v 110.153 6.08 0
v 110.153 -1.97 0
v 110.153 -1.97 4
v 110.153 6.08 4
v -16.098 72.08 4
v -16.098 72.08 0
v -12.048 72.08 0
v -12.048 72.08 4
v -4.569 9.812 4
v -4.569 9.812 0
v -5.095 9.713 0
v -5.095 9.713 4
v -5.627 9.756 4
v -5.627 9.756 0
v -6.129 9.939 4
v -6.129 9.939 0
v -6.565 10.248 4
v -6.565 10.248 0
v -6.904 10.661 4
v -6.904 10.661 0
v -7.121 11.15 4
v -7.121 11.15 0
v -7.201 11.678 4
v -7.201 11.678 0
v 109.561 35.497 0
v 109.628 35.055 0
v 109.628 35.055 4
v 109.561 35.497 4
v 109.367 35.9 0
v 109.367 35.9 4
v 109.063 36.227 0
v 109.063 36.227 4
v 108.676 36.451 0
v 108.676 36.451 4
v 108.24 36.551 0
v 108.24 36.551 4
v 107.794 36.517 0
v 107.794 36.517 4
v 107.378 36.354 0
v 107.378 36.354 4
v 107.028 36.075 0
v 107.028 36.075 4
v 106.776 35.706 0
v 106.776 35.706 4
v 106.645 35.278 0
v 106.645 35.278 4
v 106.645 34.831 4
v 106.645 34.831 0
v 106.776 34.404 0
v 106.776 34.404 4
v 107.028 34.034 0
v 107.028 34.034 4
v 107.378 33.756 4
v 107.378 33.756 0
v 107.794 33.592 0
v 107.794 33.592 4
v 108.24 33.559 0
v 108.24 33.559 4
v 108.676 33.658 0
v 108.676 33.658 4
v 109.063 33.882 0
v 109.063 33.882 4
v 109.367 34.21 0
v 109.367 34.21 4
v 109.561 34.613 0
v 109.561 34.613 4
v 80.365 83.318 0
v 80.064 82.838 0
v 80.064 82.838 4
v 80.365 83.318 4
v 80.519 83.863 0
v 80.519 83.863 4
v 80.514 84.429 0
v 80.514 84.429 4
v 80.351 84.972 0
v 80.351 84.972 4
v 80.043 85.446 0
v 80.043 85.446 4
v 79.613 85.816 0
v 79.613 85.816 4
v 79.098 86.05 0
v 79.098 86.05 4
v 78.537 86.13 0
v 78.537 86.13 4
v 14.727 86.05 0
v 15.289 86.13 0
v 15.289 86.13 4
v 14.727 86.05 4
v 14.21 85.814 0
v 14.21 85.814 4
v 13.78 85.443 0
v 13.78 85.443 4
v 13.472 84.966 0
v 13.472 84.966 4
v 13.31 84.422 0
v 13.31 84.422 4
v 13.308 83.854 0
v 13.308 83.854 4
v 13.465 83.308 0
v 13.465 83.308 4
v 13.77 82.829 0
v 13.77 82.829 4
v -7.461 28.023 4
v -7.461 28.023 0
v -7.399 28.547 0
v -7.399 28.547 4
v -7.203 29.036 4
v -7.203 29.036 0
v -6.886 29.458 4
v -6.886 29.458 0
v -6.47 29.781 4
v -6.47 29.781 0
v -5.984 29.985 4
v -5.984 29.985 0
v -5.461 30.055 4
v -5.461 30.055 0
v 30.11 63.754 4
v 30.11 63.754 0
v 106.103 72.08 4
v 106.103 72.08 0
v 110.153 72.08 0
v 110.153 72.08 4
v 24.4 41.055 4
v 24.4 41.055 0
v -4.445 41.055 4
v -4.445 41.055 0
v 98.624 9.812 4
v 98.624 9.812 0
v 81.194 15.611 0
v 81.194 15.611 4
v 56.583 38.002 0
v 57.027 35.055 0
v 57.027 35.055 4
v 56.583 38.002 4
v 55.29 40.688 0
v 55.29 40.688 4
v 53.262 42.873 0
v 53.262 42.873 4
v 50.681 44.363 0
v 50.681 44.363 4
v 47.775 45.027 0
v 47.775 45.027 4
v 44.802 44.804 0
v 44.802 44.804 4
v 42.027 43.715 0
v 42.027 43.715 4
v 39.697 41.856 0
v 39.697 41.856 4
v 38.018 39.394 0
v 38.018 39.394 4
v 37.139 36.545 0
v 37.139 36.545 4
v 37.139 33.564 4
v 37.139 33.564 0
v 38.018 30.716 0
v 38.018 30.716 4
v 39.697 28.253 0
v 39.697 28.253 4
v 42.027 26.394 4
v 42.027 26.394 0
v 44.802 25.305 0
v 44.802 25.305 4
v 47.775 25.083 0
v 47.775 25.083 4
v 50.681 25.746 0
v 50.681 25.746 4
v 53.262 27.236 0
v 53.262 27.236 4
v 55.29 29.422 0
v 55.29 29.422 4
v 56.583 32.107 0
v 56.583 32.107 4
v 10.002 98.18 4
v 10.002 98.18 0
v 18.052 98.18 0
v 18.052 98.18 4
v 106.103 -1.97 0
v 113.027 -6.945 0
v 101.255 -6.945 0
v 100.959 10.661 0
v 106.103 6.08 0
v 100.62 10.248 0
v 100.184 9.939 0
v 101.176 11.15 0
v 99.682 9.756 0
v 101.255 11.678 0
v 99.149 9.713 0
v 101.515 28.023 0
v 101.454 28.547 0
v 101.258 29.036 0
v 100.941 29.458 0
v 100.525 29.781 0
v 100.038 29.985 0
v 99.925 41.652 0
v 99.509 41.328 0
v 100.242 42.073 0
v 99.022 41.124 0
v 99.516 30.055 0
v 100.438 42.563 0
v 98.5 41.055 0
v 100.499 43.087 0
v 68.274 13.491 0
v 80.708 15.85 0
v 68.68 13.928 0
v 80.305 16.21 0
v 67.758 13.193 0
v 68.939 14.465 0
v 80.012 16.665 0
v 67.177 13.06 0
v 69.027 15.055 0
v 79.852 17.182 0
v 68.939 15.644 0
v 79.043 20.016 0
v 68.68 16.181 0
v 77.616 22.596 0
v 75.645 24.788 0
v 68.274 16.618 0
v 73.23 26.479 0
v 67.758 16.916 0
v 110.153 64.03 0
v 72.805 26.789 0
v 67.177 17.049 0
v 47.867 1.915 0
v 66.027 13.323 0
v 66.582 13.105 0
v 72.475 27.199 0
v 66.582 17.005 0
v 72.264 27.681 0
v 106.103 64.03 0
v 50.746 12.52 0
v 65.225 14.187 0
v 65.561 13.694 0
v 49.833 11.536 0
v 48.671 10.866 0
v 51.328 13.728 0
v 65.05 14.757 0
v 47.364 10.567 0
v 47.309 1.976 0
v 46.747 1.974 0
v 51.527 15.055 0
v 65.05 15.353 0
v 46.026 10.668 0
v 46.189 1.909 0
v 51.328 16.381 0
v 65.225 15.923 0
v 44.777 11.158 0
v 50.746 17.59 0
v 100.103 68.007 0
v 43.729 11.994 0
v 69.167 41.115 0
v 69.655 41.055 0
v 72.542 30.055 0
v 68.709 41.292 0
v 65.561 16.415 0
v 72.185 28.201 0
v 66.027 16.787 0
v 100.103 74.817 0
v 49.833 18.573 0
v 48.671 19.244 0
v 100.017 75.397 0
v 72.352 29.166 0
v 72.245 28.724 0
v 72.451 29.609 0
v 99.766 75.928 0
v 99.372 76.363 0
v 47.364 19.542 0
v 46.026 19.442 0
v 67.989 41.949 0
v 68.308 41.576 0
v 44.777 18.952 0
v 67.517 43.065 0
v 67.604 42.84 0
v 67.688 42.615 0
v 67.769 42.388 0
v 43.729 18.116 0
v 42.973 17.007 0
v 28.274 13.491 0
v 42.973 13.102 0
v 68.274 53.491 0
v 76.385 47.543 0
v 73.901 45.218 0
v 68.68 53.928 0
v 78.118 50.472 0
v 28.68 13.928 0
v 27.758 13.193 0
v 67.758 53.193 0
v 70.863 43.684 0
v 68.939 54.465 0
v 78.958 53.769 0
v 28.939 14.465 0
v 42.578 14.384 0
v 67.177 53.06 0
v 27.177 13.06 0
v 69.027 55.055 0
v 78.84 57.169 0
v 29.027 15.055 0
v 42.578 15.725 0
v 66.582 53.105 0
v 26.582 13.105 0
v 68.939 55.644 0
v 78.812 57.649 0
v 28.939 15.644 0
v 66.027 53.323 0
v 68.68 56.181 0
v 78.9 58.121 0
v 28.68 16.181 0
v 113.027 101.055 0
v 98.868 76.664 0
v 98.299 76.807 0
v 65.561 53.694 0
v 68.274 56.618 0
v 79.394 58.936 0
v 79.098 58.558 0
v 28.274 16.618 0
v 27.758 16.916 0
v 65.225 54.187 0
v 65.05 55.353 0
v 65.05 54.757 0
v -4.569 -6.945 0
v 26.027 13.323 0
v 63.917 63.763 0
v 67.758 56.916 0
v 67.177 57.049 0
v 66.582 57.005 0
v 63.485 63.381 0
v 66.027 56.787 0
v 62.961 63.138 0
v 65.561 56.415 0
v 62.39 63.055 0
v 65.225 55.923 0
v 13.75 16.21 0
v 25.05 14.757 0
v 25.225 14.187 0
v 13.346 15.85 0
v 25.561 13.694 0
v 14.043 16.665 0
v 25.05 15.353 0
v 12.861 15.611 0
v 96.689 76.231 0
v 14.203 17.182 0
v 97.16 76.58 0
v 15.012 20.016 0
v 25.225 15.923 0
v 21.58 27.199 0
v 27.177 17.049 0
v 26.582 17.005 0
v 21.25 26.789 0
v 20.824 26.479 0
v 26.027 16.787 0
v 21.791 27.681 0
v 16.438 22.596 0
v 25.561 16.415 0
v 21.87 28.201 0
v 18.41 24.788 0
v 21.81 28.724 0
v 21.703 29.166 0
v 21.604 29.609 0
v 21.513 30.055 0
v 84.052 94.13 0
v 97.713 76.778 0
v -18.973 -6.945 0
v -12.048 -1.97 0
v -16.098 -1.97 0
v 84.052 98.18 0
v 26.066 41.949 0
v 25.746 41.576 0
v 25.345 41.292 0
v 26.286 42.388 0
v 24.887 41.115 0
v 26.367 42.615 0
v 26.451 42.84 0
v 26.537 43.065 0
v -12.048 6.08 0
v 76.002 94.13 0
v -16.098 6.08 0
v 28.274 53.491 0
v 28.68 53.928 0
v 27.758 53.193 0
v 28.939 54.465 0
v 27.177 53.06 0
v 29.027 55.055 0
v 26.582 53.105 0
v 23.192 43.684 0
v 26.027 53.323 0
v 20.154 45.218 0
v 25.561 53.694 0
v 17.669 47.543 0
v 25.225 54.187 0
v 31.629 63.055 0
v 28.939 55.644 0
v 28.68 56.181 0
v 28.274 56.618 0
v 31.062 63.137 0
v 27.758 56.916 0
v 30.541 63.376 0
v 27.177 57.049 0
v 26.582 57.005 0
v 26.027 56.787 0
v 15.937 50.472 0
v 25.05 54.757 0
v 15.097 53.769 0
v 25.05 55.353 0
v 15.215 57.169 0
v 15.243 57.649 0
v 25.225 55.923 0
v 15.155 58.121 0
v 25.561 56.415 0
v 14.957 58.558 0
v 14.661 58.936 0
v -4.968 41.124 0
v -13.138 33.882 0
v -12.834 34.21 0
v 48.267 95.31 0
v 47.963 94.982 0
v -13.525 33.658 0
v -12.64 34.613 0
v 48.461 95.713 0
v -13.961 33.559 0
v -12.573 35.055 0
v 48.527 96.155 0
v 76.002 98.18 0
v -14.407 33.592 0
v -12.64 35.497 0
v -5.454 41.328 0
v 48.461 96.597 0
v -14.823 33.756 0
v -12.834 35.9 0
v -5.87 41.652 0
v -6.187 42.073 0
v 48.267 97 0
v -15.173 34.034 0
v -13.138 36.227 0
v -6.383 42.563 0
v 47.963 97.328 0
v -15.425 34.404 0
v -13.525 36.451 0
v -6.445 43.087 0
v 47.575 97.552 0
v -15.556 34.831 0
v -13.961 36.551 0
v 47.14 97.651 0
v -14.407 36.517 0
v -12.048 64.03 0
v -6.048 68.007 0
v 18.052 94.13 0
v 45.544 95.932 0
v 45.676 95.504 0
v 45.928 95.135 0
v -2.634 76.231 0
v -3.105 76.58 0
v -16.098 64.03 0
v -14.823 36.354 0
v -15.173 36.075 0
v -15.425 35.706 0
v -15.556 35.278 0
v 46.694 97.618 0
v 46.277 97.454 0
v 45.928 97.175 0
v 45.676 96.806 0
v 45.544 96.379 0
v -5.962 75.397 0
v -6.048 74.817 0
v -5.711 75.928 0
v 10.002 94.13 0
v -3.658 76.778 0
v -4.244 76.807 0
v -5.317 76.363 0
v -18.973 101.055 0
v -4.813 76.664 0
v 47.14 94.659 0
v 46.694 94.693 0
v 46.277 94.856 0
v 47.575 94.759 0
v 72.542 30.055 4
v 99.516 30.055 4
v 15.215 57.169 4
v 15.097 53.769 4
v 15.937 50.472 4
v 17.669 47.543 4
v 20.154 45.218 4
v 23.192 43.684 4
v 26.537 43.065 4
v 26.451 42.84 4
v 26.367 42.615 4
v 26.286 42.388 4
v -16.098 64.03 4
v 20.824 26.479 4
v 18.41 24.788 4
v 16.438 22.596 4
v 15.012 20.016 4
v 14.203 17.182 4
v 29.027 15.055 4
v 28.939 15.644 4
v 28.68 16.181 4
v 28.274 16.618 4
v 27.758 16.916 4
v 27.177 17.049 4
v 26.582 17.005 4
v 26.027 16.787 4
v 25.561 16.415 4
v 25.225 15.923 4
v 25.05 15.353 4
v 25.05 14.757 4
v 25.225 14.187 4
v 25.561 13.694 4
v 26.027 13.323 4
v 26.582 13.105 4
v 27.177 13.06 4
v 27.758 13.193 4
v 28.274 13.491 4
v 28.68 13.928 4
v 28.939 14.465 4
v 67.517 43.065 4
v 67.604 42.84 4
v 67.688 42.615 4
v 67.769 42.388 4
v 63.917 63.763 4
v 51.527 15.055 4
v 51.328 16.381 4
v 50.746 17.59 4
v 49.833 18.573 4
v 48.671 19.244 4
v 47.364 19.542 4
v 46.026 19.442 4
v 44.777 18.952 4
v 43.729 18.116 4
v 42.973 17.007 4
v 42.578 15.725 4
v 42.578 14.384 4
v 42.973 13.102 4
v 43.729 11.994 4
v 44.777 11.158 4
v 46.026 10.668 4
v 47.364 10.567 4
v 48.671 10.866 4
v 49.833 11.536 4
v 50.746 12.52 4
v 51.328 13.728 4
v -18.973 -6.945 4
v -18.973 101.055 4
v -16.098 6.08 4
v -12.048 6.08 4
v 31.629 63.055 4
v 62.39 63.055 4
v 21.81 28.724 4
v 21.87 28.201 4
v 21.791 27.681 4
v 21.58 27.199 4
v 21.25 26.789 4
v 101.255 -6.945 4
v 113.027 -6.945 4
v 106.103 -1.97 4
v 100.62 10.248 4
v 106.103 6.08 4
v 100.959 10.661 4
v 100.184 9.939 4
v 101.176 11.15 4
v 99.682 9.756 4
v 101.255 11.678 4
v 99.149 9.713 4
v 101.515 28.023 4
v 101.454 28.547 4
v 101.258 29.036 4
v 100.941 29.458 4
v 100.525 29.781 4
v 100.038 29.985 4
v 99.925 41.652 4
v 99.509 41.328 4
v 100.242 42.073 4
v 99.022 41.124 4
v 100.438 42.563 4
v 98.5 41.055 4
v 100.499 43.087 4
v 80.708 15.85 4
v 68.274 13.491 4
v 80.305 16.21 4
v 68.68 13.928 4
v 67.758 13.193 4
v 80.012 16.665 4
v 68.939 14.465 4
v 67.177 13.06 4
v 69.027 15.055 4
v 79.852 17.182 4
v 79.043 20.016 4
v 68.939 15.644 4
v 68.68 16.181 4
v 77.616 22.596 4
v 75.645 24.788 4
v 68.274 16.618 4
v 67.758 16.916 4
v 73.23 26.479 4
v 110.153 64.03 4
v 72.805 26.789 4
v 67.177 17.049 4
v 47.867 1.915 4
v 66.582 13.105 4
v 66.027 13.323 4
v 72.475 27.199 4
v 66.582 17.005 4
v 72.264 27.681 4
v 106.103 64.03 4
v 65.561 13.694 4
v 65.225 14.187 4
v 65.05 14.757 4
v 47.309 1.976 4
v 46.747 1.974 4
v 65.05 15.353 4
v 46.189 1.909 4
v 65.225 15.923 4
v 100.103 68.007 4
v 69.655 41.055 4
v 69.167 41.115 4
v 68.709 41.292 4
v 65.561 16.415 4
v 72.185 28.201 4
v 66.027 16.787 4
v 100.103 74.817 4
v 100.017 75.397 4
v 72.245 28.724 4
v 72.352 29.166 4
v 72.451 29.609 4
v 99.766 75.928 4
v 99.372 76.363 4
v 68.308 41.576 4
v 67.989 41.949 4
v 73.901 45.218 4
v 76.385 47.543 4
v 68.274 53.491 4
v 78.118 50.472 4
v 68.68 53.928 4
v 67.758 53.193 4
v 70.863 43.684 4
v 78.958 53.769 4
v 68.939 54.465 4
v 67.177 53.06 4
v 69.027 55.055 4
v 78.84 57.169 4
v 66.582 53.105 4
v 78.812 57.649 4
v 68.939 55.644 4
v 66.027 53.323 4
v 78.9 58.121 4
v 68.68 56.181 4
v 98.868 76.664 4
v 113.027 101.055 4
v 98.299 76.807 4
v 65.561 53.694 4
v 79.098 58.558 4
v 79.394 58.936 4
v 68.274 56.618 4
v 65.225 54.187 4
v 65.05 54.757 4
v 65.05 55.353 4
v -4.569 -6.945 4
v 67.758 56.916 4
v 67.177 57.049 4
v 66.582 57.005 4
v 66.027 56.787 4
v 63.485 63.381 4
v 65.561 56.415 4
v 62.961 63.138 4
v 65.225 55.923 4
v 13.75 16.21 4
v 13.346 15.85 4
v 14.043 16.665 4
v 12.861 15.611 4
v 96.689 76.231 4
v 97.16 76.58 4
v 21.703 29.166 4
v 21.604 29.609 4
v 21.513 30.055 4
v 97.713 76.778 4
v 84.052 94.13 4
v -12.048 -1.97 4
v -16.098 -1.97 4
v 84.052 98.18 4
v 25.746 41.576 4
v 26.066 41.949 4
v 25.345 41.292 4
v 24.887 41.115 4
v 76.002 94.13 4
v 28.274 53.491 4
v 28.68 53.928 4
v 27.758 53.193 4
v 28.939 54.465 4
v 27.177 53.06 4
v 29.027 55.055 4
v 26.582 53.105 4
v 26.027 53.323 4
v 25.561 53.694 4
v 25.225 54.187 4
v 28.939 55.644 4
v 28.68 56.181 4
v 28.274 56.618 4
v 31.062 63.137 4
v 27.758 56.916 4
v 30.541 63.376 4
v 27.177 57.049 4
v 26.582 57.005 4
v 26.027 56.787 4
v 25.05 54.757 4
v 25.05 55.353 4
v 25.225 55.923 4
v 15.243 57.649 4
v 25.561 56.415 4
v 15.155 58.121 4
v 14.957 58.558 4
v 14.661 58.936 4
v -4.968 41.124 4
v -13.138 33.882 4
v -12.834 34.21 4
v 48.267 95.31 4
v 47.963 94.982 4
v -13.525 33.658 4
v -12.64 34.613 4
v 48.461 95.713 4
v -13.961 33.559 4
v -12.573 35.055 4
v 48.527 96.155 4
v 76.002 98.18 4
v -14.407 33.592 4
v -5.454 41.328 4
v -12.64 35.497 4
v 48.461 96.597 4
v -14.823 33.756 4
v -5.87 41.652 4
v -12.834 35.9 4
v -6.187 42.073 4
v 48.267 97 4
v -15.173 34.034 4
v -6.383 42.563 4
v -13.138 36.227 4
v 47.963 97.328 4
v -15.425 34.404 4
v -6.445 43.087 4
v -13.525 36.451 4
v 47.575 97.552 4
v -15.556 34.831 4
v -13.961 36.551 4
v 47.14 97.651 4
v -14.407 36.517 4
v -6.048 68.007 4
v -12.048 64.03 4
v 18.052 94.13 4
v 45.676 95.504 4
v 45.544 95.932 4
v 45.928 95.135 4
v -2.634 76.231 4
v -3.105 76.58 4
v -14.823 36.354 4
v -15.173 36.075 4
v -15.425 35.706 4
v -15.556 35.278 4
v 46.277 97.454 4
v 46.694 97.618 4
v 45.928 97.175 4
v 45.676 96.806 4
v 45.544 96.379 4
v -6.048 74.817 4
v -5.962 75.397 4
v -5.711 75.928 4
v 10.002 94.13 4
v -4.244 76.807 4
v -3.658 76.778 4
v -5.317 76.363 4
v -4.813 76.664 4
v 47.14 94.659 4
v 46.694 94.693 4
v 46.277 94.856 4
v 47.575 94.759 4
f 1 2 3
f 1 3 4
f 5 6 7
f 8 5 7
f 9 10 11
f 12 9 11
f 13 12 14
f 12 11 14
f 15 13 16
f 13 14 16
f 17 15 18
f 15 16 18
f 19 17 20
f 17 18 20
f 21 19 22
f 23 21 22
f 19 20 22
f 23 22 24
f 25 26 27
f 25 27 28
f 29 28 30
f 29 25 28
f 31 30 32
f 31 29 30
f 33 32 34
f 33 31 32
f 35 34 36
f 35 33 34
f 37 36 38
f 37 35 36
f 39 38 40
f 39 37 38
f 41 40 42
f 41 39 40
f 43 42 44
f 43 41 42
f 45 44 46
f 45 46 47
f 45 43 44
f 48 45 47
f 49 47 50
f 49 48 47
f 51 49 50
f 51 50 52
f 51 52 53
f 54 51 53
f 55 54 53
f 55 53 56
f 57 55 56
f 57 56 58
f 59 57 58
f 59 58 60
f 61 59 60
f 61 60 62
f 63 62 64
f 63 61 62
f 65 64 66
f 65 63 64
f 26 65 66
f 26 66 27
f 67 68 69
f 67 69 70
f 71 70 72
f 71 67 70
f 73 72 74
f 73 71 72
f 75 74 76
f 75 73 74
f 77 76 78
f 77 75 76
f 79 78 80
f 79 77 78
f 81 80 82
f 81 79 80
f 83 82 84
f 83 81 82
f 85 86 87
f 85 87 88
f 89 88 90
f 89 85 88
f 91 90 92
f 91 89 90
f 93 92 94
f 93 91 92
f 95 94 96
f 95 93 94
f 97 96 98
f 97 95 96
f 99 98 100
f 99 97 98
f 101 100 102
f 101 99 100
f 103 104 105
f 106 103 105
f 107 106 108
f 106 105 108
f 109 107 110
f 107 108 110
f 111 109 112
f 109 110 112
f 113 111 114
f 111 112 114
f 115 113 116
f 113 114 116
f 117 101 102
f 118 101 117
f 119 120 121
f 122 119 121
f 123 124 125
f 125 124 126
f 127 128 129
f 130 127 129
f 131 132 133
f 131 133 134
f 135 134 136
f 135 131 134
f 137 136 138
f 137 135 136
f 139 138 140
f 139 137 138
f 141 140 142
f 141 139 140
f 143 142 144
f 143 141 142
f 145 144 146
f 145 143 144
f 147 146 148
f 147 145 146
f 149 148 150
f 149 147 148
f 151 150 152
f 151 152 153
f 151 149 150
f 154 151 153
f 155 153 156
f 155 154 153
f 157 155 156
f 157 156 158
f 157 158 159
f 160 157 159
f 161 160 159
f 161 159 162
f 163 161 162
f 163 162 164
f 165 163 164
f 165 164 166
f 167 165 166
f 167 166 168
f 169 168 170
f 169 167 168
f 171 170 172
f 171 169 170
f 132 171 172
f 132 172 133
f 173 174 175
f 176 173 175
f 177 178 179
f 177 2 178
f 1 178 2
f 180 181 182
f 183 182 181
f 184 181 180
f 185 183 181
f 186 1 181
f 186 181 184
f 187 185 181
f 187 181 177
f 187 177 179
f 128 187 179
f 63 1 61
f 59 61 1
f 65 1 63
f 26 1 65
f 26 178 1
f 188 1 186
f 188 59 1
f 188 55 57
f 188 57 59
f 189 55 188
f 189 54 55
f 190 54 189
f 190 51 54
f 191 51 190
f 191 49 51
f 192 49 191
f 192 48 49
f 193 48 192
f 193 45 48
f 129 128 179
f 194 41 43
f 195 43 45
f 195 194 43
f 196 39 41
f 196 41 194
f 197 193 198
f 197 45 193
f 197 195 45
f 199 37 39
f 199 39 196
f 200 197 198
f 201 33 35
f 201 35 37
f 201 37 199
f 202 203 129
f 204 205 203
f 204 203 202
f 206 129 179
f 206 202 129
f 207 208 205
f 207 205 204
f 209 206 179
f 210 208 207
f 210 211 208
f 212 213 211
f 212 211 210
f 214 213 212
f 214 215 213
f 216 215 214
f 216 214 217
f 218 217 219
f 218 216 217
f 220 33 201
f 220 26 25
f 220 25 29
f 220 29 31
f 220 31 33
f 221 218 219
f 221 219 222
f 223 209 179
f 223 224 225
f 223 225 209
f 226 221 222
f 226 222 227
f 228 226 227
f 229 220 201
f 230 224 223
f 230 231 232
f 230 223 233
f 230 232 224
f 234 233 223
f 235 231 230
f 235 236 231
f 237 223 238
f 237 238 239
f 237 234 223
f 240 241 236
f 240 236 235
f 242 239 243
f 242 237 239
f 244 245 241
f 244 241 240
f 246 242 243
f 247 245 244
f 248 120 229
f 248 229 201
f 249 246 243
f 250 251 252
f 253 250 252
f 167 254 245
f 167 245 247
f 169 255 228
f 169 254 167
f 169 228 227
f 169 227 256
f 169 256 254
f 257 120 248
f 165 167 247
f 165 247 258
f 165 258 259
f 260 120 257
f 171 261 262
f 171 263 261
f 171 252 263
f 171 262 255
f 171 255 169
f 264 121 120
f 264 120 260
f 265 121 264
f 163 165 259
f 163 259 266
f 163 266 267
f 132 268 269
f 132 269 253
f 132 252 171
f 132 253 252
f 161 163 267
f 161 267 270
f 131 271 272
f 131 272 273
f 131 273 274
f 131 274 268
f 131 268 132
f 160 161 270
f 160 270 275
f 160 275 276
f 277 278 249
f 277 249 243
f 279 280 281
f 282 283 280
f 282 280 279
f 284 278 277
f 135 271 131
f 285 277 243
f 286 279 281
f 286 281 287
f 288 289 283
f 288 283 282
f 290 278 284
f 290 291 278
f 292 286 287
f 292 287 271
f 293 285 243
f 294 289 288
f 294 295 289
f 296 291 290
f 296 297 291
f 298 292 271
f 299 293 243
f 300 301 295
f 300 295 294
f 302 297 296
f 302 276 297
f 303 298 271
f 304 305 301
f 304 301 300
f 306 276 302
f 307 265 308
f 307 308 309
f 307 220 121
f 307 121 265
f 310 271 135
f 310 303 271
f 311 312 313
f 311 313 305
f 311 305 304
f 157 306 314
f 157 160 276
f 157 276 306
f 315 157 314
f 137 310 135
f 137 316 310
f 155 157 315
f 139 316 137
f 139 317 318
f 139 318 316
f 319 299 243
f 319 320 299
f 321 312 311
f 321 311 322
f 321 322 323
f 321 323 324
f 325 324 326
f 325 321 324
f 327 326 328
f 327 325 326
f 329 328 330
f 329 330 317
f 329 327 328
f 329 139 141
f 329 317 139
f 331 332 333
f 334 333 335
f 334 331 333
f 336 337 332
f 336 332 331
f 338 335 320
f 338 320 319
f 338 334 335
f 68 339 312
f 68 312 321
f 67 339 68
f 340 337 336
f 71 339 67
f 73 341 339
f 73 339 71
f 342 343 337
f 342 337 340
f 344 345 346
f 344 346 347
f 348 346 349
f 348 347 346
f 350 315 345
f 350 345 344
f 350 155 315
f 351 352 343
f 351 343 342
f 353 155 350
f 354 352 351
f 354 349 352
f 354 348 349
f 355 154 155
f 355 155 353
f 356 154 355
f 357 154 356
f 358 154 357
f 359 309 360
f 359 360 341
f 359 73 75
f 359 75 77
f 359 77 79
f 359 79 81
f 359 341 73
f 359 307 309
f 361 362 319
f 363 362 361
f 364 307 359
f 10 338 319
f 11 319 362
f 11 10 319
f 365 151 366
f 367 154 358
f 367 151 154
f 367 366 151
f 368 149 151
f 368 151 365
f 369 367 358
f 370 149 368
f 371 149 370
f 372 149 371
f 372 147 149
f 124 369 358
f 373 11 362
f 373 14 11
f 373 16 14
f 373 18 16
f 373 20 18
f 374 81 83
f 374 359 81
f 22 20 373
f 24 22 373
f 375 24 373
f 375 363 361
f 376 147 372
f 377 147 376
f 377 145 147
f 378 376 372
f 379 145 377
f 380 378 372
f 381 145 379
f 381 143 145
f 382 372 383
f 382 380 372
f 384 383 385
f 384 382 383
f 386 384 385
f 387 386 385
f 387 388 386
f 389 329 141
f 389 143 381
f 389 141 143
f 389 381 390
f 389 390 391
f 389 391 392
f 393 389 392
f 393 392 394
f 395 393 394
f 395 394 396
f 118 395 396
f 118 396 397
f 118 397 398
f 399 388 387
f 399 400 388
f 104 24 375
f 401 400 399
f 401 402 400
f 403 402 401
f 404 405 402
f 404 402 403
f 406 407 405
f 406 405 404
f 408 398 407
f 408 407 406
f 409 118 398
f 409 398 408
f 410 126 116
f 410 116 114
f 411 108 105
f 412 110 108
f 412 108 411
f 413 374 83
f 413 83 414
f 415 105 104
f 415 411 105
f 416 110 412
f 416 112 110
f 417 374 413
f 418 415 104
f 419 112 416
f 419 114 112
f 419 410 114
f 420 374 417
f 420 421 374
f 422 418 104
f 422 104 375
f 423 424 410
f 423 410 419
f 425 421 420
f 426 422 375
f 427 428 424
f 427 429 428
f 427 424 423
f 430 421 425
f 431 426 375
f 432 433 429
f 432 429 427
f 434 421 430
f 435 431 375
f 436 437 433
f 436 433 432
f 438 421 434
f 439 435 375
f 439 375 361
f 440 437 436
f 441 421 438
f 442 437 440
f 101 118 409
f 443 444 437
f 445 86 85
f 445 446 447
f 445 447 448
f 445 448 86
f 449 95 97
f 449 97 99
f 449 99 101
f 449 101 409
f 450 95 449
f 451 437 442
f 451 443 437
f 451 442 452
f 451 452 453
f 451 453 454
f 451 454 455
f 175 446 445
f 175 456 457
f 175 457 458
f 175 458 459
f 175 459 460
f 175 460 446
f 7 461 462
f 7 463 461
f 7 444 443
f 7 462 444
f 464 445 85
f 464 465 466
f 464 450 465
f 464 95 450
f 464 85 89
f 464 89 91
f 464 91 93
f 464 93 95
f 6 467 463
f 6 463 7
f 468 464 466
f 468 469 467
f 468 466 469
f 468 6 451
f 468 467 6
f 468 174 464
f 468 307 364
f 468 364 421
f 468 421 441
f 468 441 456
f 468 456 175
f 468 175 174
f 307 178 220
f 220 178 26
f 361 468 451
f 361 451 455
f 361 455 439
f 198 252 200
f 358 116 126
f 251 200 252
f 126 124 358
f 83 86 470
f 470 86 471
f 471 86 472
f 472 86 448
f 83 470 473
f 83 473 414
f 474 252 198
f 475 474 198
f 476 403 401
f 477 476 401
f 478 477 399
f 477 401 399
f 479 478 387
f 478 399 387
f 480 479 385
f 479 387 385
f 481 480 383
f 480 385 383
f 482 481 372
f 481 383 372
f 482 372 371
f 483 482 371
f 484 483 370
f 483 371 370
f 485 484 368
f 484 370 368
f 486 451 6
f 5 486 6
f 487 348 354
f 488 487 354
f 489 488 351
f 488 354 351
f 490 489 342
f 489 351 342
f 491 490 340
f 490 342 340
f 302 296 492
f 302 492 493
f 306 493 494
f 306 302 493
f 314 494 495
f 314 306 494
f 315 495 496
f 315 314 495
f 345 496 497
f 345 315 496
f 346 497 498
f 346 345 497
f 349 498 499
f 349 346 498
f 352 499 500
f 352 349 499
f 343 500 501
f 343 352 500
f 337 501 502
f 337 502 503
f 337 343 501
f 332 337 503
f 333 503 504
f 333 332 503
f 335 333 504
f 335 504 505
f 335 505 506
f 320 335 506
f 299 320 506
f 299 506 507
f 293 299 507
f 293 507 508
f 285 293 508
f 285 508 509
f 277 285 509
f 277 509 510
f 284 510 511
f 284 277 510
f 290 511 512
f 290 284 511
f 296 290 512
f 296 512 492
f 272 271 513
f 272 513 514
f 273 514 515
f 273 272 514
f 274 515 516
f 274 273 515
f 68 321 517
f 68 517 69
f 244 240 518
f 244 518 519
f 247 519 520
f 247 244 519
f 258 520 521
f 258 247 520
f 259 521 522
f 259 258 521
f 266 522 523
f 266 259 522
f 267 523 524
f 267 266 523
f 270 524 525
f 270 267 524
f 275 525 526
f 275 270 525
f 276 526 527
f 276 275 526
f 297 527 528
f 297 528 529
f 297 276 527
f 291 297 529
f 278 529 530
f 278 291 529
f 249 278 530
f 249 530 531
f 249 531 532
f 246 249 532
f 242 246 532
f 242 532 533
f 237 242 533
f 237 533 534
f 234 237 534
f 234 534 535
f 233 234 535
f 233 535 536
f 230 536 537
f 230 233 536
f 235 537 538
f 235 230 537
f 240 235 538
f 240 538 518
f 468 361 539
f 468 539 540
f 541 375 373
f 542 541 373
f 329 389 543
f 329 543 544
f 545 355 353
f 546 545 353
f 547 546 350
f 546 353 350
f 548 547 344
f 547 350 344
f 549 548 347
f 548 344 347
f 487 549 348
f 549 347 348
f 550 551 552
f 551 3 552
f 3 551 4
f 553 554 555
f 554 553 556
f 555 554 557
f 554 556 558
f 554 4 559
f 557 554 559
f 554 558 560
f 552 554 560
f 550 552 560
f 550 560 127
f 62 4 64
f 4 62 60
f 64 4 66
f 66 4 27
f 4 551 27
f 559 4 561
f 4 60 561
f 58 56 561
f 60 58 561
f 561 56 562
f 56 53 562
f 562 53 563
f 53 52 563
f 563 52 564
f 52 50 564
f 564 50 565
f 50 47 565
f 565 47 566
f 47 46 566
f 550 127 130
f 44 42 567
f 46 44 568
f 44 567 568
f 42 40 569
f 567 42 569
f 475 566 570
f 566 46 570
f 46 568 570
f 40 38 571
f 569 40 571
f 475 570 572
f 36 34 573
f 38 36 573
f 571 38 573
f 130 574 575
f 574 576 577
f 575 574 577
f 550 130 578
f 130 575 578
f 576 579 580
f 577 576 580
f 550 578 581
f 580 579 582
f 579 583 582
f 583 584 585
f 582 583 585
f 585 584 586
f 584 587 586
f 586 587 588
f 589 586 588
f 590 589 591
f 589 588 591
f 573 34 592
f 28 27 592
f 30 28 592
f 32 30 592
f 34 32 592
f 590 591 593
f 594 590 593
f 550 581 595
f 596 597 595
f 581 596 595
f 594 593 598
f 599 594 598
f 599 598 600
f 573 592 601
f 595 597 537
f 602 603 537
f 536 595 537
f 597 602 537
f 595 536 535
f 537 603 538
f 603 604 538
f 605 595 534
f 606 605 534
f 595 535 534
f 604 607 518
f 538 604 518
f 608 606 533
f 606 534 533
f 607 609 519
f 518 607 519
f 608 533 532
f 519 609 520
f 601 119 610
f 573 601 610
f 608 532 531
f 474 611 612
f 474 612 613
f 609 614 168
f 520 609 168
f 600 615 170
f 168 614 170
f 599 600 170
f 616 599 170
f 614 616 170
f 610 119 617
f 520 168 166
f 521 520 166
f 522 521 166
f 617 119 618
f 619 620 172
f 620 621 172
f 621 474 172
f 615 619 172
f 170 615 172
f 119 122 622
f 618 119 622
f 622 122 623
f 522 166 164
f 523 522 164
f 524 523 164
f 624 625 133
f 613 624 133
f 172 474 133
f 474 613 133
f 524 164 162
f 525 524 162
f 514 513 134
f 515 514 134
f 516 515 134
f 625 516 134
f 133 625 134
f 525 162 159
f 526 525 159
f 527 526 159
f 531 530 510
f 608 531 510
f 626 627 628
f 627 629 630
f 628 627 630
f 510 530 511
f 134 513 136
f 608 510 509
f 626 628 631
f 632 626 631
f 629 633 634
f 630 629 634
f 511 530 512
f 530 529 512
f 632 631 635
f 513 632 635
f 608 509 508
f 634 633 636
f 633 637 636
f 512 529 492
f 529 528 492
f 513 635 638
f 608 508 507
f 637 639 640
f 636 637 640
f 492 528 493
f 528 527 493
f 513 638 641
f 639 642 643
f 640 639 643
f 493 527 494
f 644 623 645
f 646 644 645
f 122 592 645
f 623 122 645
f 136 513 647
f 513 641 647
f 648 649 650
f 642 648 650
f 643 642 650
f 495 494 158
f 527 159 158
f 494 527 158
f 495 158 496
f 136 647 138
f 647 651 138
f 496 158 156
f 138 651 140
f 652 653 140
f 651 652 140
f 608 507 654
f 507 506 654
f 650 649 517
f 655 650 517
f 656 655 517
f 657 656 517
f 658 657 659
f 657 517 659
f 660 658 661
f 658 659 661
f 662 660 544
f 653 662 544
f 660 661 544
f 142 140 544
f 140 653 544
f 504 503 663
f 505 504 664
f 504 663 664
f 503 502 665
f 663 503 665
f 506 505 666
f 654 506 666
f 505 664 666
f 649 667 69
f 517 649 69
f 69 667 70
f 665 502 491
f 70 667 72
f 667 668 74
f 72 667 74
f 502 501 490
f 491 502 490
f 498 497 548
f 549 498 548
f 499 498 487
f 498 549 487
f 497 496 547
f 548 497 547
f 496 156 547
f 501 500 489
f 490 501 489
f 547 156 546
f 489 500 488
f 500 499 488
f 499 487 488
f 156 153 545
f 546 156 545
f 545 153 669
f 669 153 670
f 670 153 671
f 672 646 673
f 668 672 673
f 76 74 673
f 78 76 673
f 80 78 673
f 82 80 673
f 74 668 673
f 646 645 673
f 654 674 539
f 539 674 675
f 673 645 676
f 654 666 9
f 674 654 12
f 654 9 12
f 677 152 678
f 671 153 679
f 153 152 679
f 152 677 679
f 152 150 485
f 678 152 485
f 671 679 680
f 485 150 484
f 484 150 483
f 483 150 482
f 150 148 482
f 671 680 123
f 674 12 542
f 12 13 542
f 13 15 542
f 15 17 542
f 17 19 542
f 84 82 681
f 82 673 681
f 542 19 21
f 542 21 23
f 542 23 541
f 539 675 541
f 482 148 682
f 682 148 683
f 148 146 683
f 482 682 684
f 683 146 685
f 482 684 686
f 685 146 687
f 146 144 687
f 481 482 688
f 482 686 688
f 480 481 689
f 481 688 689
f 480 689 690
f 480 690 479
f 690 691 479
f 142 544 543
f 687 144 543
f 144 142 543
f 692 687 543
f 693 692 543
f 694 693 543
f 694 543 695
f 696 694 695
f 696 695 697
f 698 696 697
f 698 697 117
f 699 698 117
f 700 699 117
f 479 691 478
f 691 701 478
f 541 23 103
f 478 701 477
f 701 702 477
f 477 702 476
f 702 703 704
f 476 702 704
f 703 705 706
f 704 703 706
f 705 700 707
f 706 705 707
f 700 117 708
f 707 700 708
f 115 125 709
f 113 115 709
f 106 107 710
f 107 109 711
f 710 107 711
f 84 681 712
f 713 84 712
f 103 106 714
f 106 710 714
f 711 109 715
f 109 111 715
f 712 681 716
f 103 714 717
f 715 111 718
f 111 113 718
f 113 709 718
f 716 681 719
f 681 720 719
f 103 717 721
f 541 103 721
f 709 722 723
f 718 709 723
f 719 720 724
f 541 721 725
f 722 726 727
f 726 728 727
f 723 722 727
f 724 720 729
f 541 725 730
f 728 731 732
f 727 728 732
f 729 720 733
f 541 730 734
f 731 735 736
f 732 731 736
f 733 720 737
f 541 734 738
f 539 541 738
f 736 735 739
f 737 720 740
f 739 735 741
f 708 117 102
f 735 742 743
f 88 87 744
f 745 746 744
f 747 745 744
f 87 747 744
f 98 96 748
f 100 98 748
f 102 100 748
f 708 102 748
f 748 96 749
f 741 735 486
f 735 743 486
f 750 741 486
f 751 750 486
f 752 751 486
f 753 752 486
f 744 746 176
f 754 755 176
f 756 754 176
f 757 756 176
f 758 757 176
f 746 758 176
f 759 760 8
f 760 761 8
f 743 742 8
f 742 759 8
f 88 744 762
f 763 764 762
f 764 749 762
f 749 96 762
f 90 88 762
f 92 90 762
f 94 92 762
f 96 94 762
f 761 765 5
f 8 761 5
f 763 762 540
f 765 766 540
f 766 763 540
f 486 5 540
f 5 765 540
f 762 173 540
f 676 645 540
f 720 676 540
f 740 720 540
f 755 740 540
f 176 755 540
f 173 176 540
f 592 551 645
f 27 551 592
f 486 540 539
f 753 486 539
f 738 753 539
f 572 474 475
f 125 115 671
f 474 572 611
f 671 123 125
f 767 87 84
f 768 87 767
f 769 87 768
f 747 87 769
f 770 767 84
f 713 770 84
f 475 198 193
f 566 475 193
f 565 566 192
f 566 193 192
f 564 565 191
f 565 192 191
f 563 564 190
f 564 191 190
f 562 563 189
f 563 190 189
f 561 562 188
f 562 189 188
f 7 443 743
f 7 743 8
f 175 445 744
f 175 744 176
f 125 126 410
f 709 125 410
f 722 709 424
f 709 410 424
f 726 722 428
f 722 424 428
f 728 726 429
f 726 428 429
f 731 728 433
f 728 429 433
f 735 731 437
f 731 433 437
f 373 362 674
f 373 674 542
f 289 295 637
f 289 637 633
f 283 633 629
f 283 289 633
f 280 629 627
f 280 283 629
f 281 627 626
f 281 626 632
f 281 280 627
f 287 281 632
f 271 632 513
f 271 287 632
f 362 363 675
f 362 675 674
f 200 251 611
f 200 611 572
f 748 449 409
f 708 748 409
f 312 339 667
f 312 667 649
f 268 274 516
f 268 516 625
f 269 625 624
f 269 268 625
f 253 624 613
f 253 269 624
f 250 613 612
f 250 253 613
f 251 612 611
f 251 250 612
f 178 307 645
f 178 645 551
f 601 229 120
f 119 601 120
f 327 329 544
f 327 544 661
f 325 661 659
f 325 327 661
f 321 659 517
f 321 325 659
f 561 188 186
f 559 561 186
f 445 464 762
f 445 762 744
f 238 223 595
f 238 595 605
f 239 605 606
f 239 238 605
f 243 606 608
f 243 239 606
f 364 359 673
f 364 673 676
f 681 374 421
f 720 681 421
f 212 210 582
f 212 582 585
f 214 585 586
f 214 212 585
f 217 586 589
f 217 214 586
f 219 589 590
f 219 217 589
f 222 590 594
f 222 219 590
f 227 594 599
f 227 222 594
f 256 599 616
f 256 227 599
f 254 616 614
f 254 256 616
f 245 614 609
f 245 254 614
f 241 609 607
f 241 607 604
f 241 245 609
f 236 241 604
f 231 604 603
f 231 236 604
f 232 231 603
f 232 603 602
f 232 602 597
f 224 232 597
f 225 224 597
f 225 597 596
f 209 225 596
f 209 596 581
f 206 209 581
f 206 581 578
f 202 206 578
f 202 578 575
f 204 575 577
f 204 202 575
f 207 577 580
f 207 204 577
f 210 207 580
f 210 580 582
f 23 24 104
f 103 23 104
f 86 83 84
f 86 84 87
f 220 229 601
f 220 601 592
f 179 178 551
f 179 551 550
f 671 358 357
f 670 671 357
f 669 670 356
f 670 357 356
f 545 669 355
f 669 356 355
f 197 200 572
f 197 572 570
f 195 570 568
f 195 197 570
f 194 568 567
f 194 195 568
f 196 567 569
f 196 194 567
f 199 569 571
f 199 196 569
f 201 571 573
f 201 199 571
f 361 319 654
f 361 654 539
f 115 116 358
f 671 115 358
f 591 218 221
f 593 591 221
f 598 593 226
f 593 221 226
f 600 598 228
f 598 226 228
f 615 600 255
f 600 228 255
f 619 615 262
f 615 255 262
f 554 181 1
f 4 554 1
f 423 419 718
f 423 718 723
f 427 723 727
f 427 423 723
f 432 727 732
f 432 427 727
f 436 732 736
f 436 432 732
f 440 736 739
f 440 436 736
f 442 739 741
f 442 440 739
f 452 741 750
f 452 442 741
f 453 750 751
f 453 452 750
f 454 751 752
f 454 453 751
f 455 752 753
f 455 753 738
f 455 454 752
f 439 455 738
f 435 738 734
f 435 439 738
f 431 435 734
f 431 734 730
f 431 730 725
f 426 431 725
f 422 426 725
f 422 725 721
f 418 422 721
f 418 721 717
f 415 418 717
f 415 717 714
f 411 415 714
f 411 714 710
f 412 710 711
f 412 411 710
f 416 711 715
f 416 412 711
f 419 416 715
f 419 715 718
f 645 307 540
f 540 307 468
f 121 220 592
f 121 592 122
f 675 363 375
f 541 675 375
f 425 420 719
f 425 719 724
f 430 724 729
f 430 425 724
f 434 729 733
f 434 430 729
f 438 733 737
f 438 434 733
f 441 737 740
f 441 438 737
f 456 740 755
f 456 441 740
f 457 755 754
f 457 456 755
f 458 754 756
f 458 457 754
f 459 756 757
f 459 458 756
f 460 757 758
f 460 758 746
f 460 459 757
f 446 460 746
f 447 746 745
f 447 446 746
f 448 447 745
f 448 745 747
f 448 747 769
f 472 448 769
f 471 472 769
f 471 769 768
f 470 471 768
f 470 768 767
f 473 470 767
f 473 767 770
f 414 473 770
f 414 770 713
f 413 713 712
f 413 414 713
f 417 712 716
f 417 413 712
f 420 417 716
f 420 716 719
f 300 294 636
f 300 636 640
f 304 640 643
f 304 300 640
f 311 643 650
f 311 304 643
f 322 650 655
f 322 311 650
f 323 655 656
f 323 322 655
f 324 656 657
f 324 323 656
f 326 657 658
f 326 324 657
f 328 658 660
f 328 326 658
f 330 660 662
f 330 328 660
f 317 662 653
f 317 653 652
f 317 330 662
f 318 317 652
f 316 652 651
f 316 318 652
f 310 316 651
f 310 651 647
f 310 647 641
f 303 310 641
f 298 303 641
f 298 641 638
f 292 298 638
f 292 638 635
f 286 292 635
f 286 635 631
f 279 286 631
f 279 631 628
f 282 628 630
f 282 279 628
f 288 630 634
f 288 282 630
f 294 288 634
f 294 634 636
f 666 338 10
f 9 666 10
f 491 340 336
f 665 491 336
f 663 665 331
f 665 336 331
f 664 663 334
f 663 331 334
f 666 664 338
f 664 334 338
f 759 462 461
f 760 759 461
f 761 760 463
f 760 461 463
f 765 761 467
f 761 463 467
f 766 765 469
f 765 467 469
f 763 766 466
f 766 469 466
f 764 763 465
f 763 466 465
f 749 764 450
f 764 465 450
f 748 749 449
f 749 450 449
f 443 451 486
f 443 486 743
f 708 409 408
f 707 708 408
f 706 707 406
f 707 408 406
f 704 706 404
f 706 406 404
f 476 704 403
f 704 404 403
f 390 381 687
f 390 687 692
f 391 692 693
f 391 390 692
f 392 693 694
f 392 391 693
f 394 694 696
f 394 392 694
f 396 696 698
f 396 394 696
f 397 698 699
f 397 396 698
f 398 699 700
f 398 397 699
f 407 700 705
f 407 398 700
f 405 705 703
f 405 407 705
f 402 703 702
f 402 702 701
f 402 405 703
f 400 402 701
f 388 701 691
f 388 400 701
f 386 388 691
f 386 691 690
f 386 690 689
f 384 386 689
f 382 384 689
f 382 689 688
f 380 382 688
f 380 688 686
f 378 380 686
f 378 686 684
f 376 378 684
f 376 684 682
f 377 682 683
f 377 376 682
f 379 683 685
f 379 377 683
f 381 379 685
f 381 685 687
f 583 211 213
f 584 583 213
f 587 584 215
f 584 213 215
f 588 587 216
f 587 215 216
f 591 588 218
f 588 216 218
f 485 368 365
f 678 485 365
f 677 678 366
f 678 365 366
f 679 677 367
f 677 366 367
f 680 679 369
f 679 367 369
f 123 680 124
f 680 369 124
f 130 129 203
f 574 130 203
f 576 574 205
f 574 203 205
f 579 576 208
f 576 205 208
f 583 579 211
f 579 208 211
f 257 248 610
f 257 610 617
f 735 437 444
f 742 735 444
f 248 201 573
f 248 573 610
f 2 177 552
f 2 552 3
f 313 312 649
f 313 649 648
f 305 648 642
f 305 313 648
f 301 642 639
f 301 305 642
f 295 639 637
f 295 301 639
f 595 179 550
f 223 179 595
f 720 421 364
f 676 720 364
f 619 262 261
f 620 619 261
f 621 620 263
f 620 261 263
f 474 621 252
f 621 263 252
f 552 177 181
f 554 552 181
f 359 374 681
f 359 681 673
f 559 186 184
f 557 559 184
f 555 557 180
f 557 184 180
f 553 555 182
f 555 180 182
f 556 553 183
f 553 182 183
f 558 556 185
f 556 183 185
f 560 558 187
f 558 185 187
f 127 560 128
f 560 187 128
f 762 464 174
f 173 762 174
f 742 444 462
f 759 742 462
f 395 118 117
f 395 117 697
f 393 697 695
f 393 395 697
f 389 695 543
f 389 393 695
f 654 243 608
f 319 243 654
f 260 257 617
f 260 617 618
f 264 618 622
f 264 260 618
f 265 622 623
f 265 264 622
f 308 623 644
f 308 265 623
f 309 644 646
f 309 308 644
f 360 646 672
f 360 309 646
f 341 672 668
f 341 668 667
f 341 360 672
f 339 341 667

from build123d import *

# Parameters (mm, degrees)
SKETCH_1_R          = 1.5
SKETCH_1_R_2        = 10
SKETCH_1_R_3        = 4.5
SKETCH_1_R_4        = 2
SKETCH_1_W          = 8.05
SKETCH_1_H          = 4.05
SKETCH_1_W_2        = 4.05
SKETCH_1_H_2        = 8.05
EXTRUDE_1_DEPTH     = 4
SKETCH_2_W          = 132
SKETCH_2_H          = 24
CUT_EXTRUDE_1_DEPTH = 4
CUT_EXTRUDE_2_DEPTH = 4


with BuildPart() as part:
    # 草图1 → 凸台-拉伸1 (new body)
    with BuildSketch(Plane.XY):
        Polygon((47.027428163, 101.054738201), (113.027428163, 101.054738201), (113.027428163, -30.945261799), (-18.972571837, -30.945261799), (-18.972571837, 101.054738201), align=None)
        with Locations((47.027428163, 96.155233813)):
            Circle(SKETCH_1_R, mode=Mode.SUBTRACT)
        with Locations((108.127923775, 35.054738201)):
            Circle(SKETCH_1_R, mode=Mode.SUBTRACT)
        with Locations((47.027428163, 35.054738201)):
            Circle(SKETCH_1_R_2, mode=Mode.SUBTRACT)
        with Locations((47.027428163, 15.054738201)):
            Circle(SKETCH_1_R_3, mode=Mode.SUBTRACT)
        with Locations((27.027428163, 15.054738201)):
            Circle(SKETCH_1_R_4, mode=Mode.SUBTRACT)
        with Locations((27.027428163, 55.054738201)):
            Circle(SKETCH_1_R_4, mode=Mode.SUBTRACT)
        with Locations((67.027428163, 55.054738201)):
            Circle(SKETCH_1_R_4, mode=Mode.SUBTRACT)
        with Locations((67.027428163, 15.054738201)):
            Circle(SKETCH_1_R_4, mode=Mode.SUBTRACT)
        with Locations((47.027428163, -26.045757411)):
            Circle(SKETCH_1_R, mode=Mode.SUBTRACT)
        with Locations((-14.073067448, 35.054738201)):
            Circle(SKETCH_1_R, mode=Mode.SUBTRACT)
        with Locations((14.027428163, 96.155233813)):
            Rectangle(SKETCH_1_W, SKETCH_1_H, mode=Mode.SUBTRACT)
        with Locations((80.027428163, 96.155233813)):
            Rectangle(SKETCH_1_W, SKETCH_1_H, mode=Mode.SUBTRACT)
        with Locations((108.127923775, 68.054738201)):
            Rectangle(SKETCH_1_W_2, SKETCH_1_H_2, mode=Mode.SUBTRACT)
        with Locations((108.127923775, 2.054738201)):
            Rectangle(SKETCH_1_W_2, SKETCH_1_H_2, mode=Mode.SUBTRACT)
        with Locations((80.027428163, -26.045757411)):
            Rectangle(SKETCH_1_W, SKETCH_1_H, mode=Mode.SUBTRACT)
        with Locations((14.027428163, -26.045757411)):
            Rectangle(SKETCH_1_W, SKETCH_1_H, mode=Mode.SUBTRACT)
        with Locations((-14.073067448, 2.054738201)):
            Rectangle(SKETCH_1_W_2, SKETCH_1_H_2, mode=Mode.SUBTRACT)
        with Locations((-14.073067448, 68.054738201)):
            Rectangle(SKETCH_1_W_2, SKETCH_1_H_2, mode=Mode.SUBTRACT)
    extrude(amount=EXTRUDE_1_DEPTH)

    # 草图2 → 切除-拉伸1 (cut)
    with BuildSketch(Plane(origin=(0, 0, 0), x_dir=(-1, 0, 0), z_dir=(0, 0, -1))):
        with Locations((-47.027428163, -18.945261799)):
            Rectangle(SKETCH_2_W, SKETCH_2_H)
    extrude(amount=-CUT_EXTRUDE_1_DEPTH, mode=Mode.SUBTRACT)

    # 草图3 → 切除-拉伸2 (cut)
    with BuildSketch(Plane(origin=(0, 0, 0), x_dir=(-1, 0, 0), z_dir=(0, 0, -1))):
        with BuildLine():
            Line((-72.542129808, 30.054738201), (-99.515674348, 30.054738201))
            ThreePointArc((-99.515674348, 30.054738201), (-100.941091534, 29.457658671), (-101.515421297, 28.022924045))
            Line((-101.515421297, 28.022924045), (-101.255391029, 11.678164385))
            ThreePointArc((-101.255391029, 11.678164385), (-100.412595688, 10.078579455), (-98.624288606, 9.812245613))
            Line((-98.624288606, 9.812245613), (-81.193952996, 15.611132086))
            ThreePointArc((-81.193952996, 15.611132086), (-80.304662874, 16.20977419), (-79.852257763, 17.181648105))
            ThreePointArc((-79.852257763, 17.181648105), (-77.616411007, 22.596186492), (-73.230421996, 26.4793987))
            ThreePointArc((-73.230421996, 26.4793987), (-72.353458134, 27.433018894), (-72.244921555, 28.724017307))
            ThreePointArc((-72.244921555, 28.724017307), (-72.402250484, 29.387429123), (-72.542129808, 30.054738201))
        make_face()
        with BuildLine():
            Line((-12.86090333, 15.611132086), (4.569432279, 9.812245613))
            ThreePointArc((4.569432279, 9.812245613), (6.357739361, 10.078579455), (7.200534703, 11.678164385))
            Line((7.200534703, 11.678164385), (7.46056497, 28.022924045))
            ThreePointArc((7.46056497, 28.022924045), (6.886235208, 29.457658671), (5.460818021, 30.054738201))
            Line((5.460818021, 30.054738201), (-21.512726519, 30.054738201))
            ThreePointArc((-21.512726519, 30.054738201), (-21.652605842, 29.387429123), (-21.809934772, 28.724017307))
            ThreePointArc((-21.809934772, 28.724017307), (-21.701398193, 27.433018894), (-20.824434331, 26.4793987))
            ThreePointArc((-20.824434331, 26.4793987), (-16.438445319, 22.596186492), (-14.202598564, 17.181648105))
            ThreePointArc((-14.202598564, 17.181648105), (-13.750193453, 16.20977419), (-12.86090333, 15.611132086))
        make_face()
        with BuildLine():
            Line((4.569432279, -6.945261799), (-101.255391029, -6.945261799))
            Line((-101.255391029, -6.945261799), (-47.866918263, 1.915411357))
            ThreePointArc((-47.866918263, 1.915411357), (-47.027723842, 1.98284019), (-46.189112393, 1.908511437))
            Line((-46.189112393, 1.908511437), (4.569432279, -6.945261799))
        make_face()
        with BuildLine():
            Line((-24.400011165, 41.054738201), (4.444782388, 41.054738201))
            ThreePointArc((4.444782388, 41.054738201), (5.870199575, 41.651817731), (6.444529337, 43.086552357))
            Line((6.444529337, 43.086552357), (6.048067448, 68.007013948))
            Line((6.048067448, 68.007013948), (6.048067448, 74.816525314))
            ThreePointArc((6.048067448, 74.816525314), (4.813434313, 76.664284379), (2.633853886, 76.230738876))
            Line((2.633853886, 76.230738876), (-14.660749072, 58.936135918))
            ThreePointArc((-14.660749072, 58.936135918), (-15.154755521, 58.120835026), (-15.21523446, 57.169467477))
            ThreePointArc((-15.21523446, 57.169467477), (-17.669451156, 47.54286318), (-26.537436176, 43.064746214))
            ThreePointArc((-26.537436176, 43.064746214), (-26.408756591, 42.727441936), (-26.285629249, 42.388071534))
            ThreePointArc((-26.285629249, 42.388071534), (-25.554711704, 41.421745039), (-24.400011165, 41.054738201))
        make_face()
        with BuildLine():
            Line((-100.102923775, 68.007013948), (-100.102923775, 74.816525314))
            ThreePointArc((-100.102923775, 74.816525314), (-98.86829064, 76.664284379), (-96.688710213, 76.230738876))
            Line((-96.688710213, 76.230738876), (-79.394107255, 58.936135918))
            ThreePointArc((-79.394107255, 58.936135918), (-78.900100806, 58.120835026), (-78.839621867, 57.169467477))
            ThreePointArc((-78.839621867, 57.169467477), (-76.385405171, 47.54286318), (-67.517420151, 43.064746214))
            ThreePointArc((-67.517420151, 43.064746214), (-67.646099736, 42.727441936), (-67.769227078, 42.388071534))
            ThreePointArc((-67.769227078, 42.388071534), (-68.500144623, 41.421745039), (-69.654845161, 41.054738201))
            Line((-69.654845161, 41.054738201), (-98.499638715, 41.054738201))
            ThreePointArc((-98.499638715, 41.054738201), (-99.925055902, 41.651817731), (-100.499385664, 43.086552357))
            Line((-100.499385664, 43.086552357), (-100.102923775, 68.007013948))
        make_face()
        with BuildLine():
            Line((-13.7697462, 82.829128974), (-30.109761047, 63.753633363))
            ThreePointArc((-30.109761047, 63.753633363), (-30.792684258, 63.237843917), (-31.628683757, 63.054738201))
            Line((-31.628683757, 63.054738201), (-62.390490848, 63.054738201))
            ThreePointArc((-62.390490848, 63.054738201), (-63.231829728, 63.240310222), (-63.917039651, 63.762589312))
            Line((-63.917039651, 63.762589312), (-80.063513586, 82.838084924))
            ThreePointArc((-80.063513586, 82.838084924), (-80.351392761, 84.971572693), (-78.536964783, 86.130233813))
            Line((-78.536964783, 86.130233813), (-15.28866891, 86.130233813))
            ThreePointArc((-15.28866891, 86.130233813), (-13.471774627, 84.966233311), (-13.7697462, 82.829128974))
        make_face()
    extrude(amount=-CUT_EXTRUDE_2_DEPTH, mode=Mode.SUBTRACT)


solid = part.part
